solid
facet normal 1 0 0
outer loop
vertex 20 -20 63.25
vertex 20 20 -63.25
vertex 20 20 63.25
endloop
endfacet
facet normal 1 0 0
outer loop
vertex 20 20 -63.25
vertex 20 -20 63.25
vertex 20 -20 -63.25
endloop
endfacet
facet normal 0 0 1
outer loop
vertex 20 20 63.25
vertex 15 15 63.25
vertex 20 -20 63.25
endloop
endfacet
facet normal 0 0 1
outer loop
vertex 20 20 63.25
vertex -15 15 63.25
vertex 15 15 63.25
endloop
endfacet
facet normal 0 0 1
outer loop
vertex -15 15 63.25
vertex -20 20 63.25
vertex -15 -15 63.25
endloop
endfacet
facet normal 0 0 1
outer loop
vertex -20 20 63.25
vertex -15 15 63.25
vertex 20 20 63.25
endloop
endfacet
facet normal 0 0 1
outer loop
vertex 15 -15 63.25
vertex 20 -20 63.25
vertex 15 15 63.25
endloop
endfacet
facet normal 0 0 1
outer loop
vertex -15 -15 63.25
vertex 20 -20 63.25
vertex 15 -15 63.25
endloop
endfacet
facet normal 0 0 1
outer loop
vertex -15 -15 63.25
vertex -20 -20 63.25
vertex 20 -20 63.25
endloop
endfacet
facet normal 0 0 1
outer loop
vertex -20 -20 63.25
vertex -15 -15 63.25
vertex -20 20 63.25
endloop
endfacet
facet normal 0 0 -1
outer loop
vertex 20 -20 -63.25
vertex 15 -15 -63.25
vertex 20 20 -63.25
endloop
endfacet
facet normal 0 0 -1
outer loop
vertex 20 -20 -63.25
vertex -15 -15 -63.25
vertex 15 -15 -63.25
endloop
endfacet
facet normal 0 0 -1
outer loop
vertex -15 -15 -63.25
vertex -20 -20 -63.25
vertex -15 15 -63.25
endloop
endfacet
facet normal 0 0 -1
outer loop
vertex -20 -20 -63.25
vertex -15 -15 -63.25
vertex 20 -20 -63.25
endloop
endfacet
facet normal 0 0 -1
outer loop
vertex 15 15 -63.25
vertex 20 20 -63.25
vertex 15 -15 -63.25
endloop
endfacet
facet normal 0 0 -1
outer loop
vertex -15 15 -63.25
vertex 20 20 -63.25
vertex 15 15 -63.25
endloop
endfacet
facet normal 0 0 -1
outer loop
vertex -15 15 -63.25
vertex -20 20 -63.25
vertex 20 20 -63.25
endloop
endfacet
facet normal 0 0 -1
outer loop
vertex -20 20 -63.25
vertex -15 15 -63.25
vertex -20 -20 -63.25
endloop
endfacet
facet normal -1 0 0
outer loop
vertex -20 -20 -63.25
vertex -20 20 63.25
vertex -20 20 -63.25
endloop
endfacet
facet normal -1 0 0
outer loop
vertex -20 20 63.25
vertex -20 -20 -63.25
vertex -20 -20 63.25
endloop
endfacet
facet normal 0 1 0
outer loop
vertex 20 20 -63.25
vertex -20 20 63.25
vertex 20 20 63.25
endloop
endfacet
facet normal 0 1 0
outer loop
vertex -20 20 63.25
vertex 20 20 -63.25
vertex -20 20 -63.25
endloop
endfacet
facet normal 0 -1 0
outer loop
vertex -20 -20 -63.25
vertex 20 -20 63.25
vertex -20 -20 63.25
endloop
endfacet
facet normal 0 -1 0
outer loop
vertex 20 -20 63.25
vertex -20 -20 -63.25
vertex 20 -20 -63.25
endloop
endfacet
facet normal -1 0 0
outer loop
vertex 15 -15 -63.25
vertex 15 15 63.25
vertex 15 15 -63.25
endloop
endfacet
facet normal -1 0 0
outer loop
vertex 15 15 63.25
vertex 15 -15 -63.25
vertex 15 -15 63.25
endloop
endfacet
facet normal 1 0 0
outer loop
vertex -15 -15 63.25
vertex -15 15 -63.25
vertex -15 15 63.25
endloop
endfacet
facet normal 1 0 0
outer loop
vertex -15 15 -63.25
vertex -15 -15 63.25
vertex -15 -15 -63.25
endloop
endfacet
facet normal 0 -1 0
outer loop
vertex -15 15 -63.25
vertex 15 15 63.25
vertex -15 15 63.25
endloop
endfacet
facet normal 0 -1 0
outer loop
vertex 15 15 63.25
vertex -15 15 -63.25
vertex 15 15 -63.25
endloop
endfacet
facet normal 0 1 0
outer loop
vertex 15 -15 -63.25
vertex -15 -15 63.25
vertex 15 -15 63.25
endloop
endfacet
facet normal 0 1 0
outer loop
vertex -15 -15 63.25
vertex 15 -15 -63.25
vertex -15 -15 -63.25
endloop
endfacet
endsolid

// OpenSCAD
// file: ../common/beam_hollow_rectangular.scad
module beam_hollow_rectangular(L, w, d, t, suppress_shopping_outputs = false) {
    difference() {
        cube([w, d, L], center = true);
        cube([w - t * 2, d - t * 2, L], center = true);
    }
    // Shopping
    if (!suppress_shopping_outputs) {
        echo(str("Rectangular Aluminium hollow beam: Rectangular Aluminium hollow beam ", L, "mm x ", w, "mm x ", d, "mm x ", t, "mm - x1"));
    }
}

beam_hollow_rectangular(500, 50, 30, 5);
// file: ../fixings/tube_clamp_square_base_plate_132_functions.scad
function get_L_shaft_with_base_plate_square_base_plate_132(beam_width) = 
    // (beam_width == 40) ?
    75
;
function get_R_plate_square_base_plate_132(beam_width) = 
    // (beam_width == 40) ?
    [143, 75, 18.5]
;
function get_thickness_square_base_plate_132(beam_width) = 
    // (beam_width == 40) ?
    8
;
function get_offset_hole_x_square_base_plate_132(beam_width) = 
    // (beam_width == 40) ?
    100 / 2
;
function get_diameter_hole_square_base_plate_132(beam_width) = 
    // (beam_width == 40) ?
    10
;
// file: ../fixings/tube_clamp_round_base_plate_132_functions.scad
function get_L_shaft_with_base_plate_round_base_plate_132(tube_diameter) = 
    (tube_diameter == 27) ? 
        85
    : (tube_diameter == 42) ?
        122
    : 25
;
function get_R_plate_round_base_plate_132(tube_diameter) = 
    (tube_diameter == 27) ? 
        [64, 114, 7]
    : (tube_diameter == 42) ?
        [80, 140, 10]
    : [10, 20, 1]
;
function get_offset_hole_y_round_base_plate_132(tube_diameter) = 
    (tube_diameter == 27) ? 
        38
    : (tube_diameter == 42) ?
        50
    : 10
;
function get_diameter_hole_round_base_plate_132(tube_diameter) = 10;
// file: ../fixings/tube_clamp_round_3_way_through_116_functions.scad
function  get_L_shaft_long_round_3_way_through_116(tube_diameter) = 
    (tube_diameter == 27) ? 
        42
    : (tube_diameter == 42) ?
        60
    : 25
;
function get_thickness_round_3_way_through_116(tube_diameter) = 7;
function get_L_shaft_short_round_3_way_through_116(tube_diameter) = tube_diameter + 2 * get_thickness_round_3_way_through_116();
// file: ../fixings/tube_clamp_round_tee_long_104_functions.scad
// include <../../config.scad>;

function get_L_shaft_long_round_tee_long_104(tube_diameter) = 
    (tube_diameter == 27) ? 
        85
    : (tube_diameter == 42) ?
        122
    : 25
;
function get_L_shaft_short_round_tee_long_104(tube_diameter) = 
    (tube_diameter == 27) ? 
        42
    : (tube_diameter == 42) ?
        61
    : 10
;
// file: brake_assembly_functions.scad
// include <../../config.scad>; // circular reference!

function get_y_pos_lead_fixing_ballscrew_to_brake_arms(angle_brake_rod, y_pos_axle_rear, x_pos_axle_leg_rear, x_offset_fixing_brake_arm_to_lead_plate) = y_pos_axle_rear + (x_pos_axle_leg_rear - x_offset_fixing_brake_arm_to_lead_plate) / tan(angle_brake_rod); // (X_POS_AXLE_LEG_REAR - X_OFFSET_FIXING_BRAKE_ARM_TO_LEAD_PLATE)
// file: ../common/metric_bolt_functions.scad
function get_metric_bolt_head_height(size) = size;
function get_metric_bolt_head_diameter(size) = size * 2;
function get_metric_bolt_washer_diameter_safe_working_clearance(size) = 
    (size < 20) ?
        4 * size
    :
        3 * size
;
// file: ../common/beam_hollow_square.scad
include <../../config.scad>;
use <./beam_hollow_rectangular.scad>;

module beam_hollow_square(L, D, T) {
    color(COLOUR_BEAM_ALUMINIUM) beam_hollow_rectangular(L, D, D, T, suppress_shopping_outputs = true);
    // Shopping
    echo(str("Square Aluminium hollow beam: Square Aluminium hollow beam ", L, "mm x ", D, "mm x ", D, "mm x ", T, "mm - x1"));
}

beam_hollow_square(L, D, T);
// main file
include <../../config.scad>;
use <../common/beam_hollow_square.scad>;

module beam_leg_ballscrew_to_bed() {
    color(COLOUR_BEAM_ALUMINIUM) beam_hollow_square(L_LEG_FIXING_BRAKE_BALLSCREW_TO_BED, D_BEAM_BRAKE, T_BEAM_BRAKE);
    // Shopping
    // Beam leg ballscrew to bed
}

beam_leg_ballscrew_to_bed();
